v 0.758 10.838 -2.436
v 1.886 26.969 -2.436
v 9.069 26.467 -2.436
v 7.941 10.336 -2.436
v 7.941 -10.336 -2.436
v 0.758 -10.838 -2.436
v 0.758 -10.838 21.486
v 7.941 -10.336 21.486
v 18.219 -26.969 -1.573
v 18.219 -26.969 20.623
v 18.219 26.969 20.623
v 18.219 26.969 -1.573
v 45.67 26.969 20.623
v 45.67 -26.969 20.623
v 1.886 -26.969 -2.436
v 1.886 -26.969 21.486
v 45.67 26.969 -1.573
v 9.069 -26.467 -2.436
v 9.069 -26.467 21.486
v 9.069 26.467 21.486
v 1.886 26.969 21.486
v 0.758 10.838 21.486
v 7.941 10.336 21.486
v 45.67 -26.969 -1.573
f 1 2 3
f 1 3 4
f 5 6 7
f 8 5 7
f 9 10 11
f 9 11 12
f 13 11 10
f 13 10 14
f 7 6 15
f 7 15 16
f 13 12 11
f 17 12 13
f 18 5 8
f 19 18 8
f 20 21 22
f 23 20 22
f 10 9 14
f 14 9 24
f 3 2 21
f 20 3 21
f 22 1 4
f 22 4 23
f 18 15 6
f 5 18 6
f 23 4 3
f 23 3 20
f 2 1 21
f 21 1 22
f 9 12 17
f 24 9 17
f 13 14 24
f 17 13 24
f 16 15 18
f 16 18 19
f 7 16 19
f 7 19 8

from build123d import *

# Parameters (mm, degrees)
BODY_DEPTH                     = 19.05
SKETCH4_R                      = 5.9436
F_10_HEAD_CLEARANCE_DEPTH      = 48.971655672
F_10_NUT_CLEARANCE_DEPTH       = 46.868801757
F_10_NUT_CLEARANCE_DEPTH_BACK  = 4.7625
FILLET2_R                      = 8.89
F_10_CLEARANCE_HOLE1_D         = 5.1054
FILLET3_R                      = 5.08
FILLET4_R                      = 2.54
F_10_CLEARANCE_HOLE2_D         = 5.1054
SKETCH11_W                     = 23.92163958
SKETCH11_H                     = 16.170942948
INFILL_BOX_MOUNT_DEPTH         = 7.2008
INFILL_BOUNDING_BOX_DEPTH      = 26.969445
INFILL_BOUNDING_BOX_DEPTH_BACK = 26.969445
SKETCH9_W                      = 27.451683019
SKETCH9_H                      = 22.196172726


# Read off the part's stored shape, not the designer's step: Body
with BuildPart() as part:
    # Body outline → Body (new body)
    with BuildSketch(Plane.XY):
        with BuildLine():
            ThreePointArc((19.563256599, 8.1915), (16.002518677, 13.919090379), (10.823670896, 18.239238727))
            Line((10.823670896, 18.239238727), (11.330509573, 25.487369503))
            Line((11.330509573, 25.487369503), (1.828711995, 26.151799916))
            Line((1.828711995, 26.151799916), (0.815034639, 11.655538363))
            ThreePointArc((0.815034639, 11.655538363), (11.684, 0), (0.815034639, -11.655538363))
            Line((0.815034639, -11.655538363), (1.828711995, -26.151799916))
            Line((1.828711995, -26.151799916), (11.330509573, -25.487369503))
            Line((11.330509573, -25.487369503), (10.823670896, -18.239238727))
            ThreePointArc((10.823670896, -18.239238727), (16.002518677, -13.919090379), (19.563256599, -8.1915))
            Line((19.563256599, -8.1915), (41.469504125, -8.1915))
            Line((41.469504125, -8.1915), (41.469504125, -5.0165))
            Line((41.469504125, -5.0165), (20.607193131, -5.0165))
            ThreePointArc((20.607193131, -5.0165), (20.948626487, -3.313114744), (21.149504125, -1.5875))
            Line((21.149504125, -1.5875), (41.469504125, -1.5875))
            Line((41.469504125, -1.5875), (41.469504125, 1.5875))
            Line((41.469504125, 1.5875), (21.149504125, 1.5875))
            ThreePointArc((21.149504125, 1.5875), (20.948626487, 3.313114744), (20.607193131, 5.0165))
            Line((20.607193131, 5.0165), (41.469504125, 5.0165))
            Line((41.469504125, 5.0165), (41.469504125, 8.1915))
            Line((41.469504125, 8.1915), (19.563256599, 8.1915))
        make_face()
    extrude(amount=BODY_DEPTH)

    # Sketch3 → CBORE for #10 Binding Head Machine Screw1 (revolve, cut)
    with BuildSketch(Plane(origin=(10.823670896, -18.239238727, 9.525), x_dir=(-0.06975647374412856, 0.9975640502598241, 0), z_dir=(0, 0, 1))):
        Polygon((0, 0), (0, 10.536208088), (2.5527, 10.536208088), (2.5527, 3.1242), (5.9436, 3.1242), (5.9436, 0), align=None)
    revolve(axis=Axis((17.158202615, -17.796285119, 9.525), (-0.9975640502598241, -0.06975647374412855, 0)), mode=Mode.SUBTRACT)

    # Sketch4 → #10 Head clearance (cut, through all)
    with BuildSketch(Plane(origin=(6.385207973, 0.446497237, 0), x_dir=(-0.06975647374412856, 0.9975640502598241, 0), z_dir=(0.9975640502598241, 0.06975647374412856, 0))):
        with Locations((-18.949829973, 9.525)):
            Circle(SKETCH4_R)
    extrude(amount=F_10_HEAD_CLEARANCE_DEPTH, mode=Mode.SUBTRACT)

    # Sketch5 → #10 nut clearance (cut, two sides: drawn at the far end of the back side and taken through both)
    with BuildSketch(Plane(origin=(9.501797579, -0.664430412, 0), x_dir=(-0.06975647374412855, -0.9975640502598241, 0), z_dir=(0.9975640502598241, -0.06975647374412855, 0)).offset(-F_10_NUT_CLEARANCE_DEPTH_BACK)):
        Polygon((-23.902829973, -6.665384117), (-23.902829973, -12.384615883), (-18.949829973, -15.244231767), (-13.996829973, -12.384615883), (-13.996829973, -6.665384117), (-18.949829973, -3.805768233), align=None)
    extrude(amount=F_10_NUT_CLEARANCE_DEPTH + F_10_NUT_CLEARANCE_DEPTH_BACK, mode=Mode.SUBTRACT)

    # Fillet2
    fillet2_edges = [part.edges().sort_by_distance(p)[0] for p in [
        (41.469504125, 6.604, 0),
        (41.469504125, 0, 0),
        (41.469504125, -6.604, 0),
        (41.469504125, -6.604, 19.05),
        (41.469504125, 0, 19.05),
        (41.469504125, 6.604, 19.05),
    ]]
    fillet(fillet2_edges, radius=FILLET2_R)

    # #10 Clearance Hole1 (through all)
    with Locations(Plane(origin=(0, -8.1915, 0), x_dir=(-1, 0, 0), z_dir=(0, -1, 0))):
        with Locations((-31.944504125, -9.525)):
            Hole(F_10_CLEARANCE_HOLE1_D / 2)

    # Fillet3
    fillet3_edges = [part.edges().sort_by_distance(p)[0] for p in [
        (19.563256599, 8.1915, 9.525),
        (19.563256599, -8.1915, 9.525),
    ]]
    fillet(fillet3_edges, radius=FILLET3_R)

    # Fillet4
    # the kernel refuses this fillet: 2.54 mm, written as the material it adds along each edge
    with BuildSketch(Plane(origin=(10.823670896, 18.239238727, 0), x_dir=(0.06975647364615441, 0.997564050266675, 0), z_dir=(0, 0, 1))) as fillet4_piece_1_section:
        with BuildLine():
            CenterArc((1.506239444, -2.54), FILLET4_R, 90, 59.467874794)
            ThreePointArc((-0.681575467, -1.249625668), (-0.330301403, -0.630532327), (0, 0))
            Line((0, 0), (1.506239444, 0))
        make_face()
    fillet4_piece_1 = extrude(amount=7.571366843, mode=Mode.PRIVATE)
    fillet4_piece_1 = split(fillet4_piece_1, bisect_by=Plane(origin=(11.045496334, 17.483235197, 3.379286412), z_dir=(0.034878236872064254, 0.49878202512991177, -0.8660254037844389)), keep=Keep.TOP, mode=Mode.PRIVATE)
    fillet4_piece_1 = split(fillet4_piece_1, bisect_by=Plane(origin=(11.16675059, 19.217251842, 3.228670408), z_dir=(-0.0348782368720643, -0.49878202512991243, -0.8660254037844384)), keep=Keep.TOP, mode=Mode.PRIVATE)
    add(fillet4_piece_1)
    with BuildSketch(Plane(origin=(10.823670896, 18.239238727, 0), x_dir=(0.06975647364615441, 0.997564050266675, 0), z_dir=(0, 0, 1))) as fillet4_piece_2_section:
        with BuildLine():
            CenterArc((1.506239444, -2.54), FILLET4_R, 90, 59.467874794)
            ThreePointArc((-0.681575467, -1.249625668), (-0.330301403, -0.630532327), (0, 0))
            Line((0, 0), (1.506239444, 0))
        make_face()
    fillet4_piece_2 = extrude(amount=7.571366843, mode=Mode.PRIVATE)
    fillet4_piece_2 = split(fillet4_piece_2, bisect_by=Plane(origin=(11.538192523, 17.902598899, 3.640659173), z_dir=(-0.034878236872064254, -0.49878202512991177, 0.8660254037844389)), keep=Keep.TOP, mode=Mode.PRIVATE)
    fillet4_piece_2 = split(fillet4_piece_2, bisect_by=Plane(origin=(11.538192523, 17.902598899, 3.970877294), z_dir=(-0.0348782368720643, -0.49878202512991243, -0.8660254037844384)), keep=Keep.TOP, mode=Mode.PRIVATE)
    add(fillet4_piece_2)
    with BuildSketch(Plane(origin=(10.823670896, 18.239238727, 0), x_dir=(0.06975647364615441, 0.997564050266675, 0), z_dir=(0, 0, 1))) as fillet4_piece_3_section:
        with BuildLine():
            CenterArc((1.506239444, -2.54), FILLET4_R, 90, 59.467874794)
            ThreePointArc((-0.681575467, -1.249625668), (-0.330301403, -0.630532327), (0, 0))
            Line((0, 0), (1.506239444, 0))
        make_face()
    fillet4_piece_3 = extrude(amount=7.571366843, mode=Mode.PRIVATE)
    fillet4_piece_3 = split(fillet4_piece_3, bisect_by=Plane(origin=(10.910701379, 18.802736053, 4.133816124), z_dir=(0.034878236872064254, 0.49878202512991177, -0.8660254037844389)), keep=Keep.TOP, mode=Mode.PRIVATE)
    fillet4_piece_3 = split(fillet4_piece_3, bisect_by=Plane(origin=(10.910701379, 18.802736053, 3.477720343), z_dir=(0.0348782368720643, 0.49878202512991243, 0.8660254037844384)), keep=Keep.TOP, mode=Mode.PRIVATE)
    add(fillet4_piece_3)
    with BuildSketch(Plane(origin=(10.823670896, 18.239238727, 11.478633157), x_dir=(0.06975647364615441, 0.997564050266675, 0), z_dir=(0, 0, 1))) as fillet4_piece_4_section:
        with BuildLine():
            CenterArc((1.506239444, -2.54), FILLET4_R, 90, 59.467874794)
            ThreePointArc((-0.681575467, -1.249625668), (-0.330301403, -0.630532327), (0, 0))
            Line((0, 0), (1.506239444, 0))
        make_face()
    fillet4_piece_4 = extrude(amount=7.571366843, mode=Mode.PRIVATE)
    fillet4_piece_4 = split(fillet4_piece_4, bisect_by=Plane(origin=(11.538192523, 17.902598899, 15.409340827), z_dir=(-0.03487823687206431, -0.4987820251299125, -0.8660254037844386)), keep=Keep.TOP, mode=Mode.PRIVATE)
    fillet4_piece_4 = split(fillet4_piece_4, bisect_by=Plane(origin=(11.538192523, 17.902598899, 15.079122706), z_dir=(-0.034878236872064254, -0.49878202512991177, 0.8660254037844388)), keep=Keep.TOP, mode=Mode.PRIVATE)
    add(fillet4_piece_4)
    with BuildSketch(Plane(origin=(10.823670896, 18.239238727, 11.478633157), x_dir=(0.06975647364615441, 0.997564050266675, 0), z_dir=(0, 0, 1))) as fillet4_piece_5_section:
        with BuildLine():
            CenterArc((1.506239444, -2.54), FILLET4_R, 90, 59.467874794)
            ThreePointArc((-0.681575467, -1.249625668), (-0.330301403, -0.630532327), (0, 0))
            Line((0, 0), (1.506239444, 0))
        make_face()
    fillet4_piece_5 = extrude(amount=7.571366843, mode=Mode.PRIVATE)
    fillet4_piece_5 = split(fillet4_piece_5, bisect_by=Plane(origin=(10.910701379, 18.802736053, 14.916183876), z_dir=(0.03487823687206431, 0.4987820251299125, 0.8660254037844386)), keep=Keep.TOP, mode=Mode.PRIVATE)
    fillet4_piece_5 = split(fillet4_piece_5, bisect_by=Plane(origin=(10.910701379, 18.802736053, 15.572279657), z_dir=(0.034878236872064254, 0.49878202512991177, -0.8660254037844388)), keep=Keep.TOP, mode=Mode.PRIVATE)
    add(fillet4_piece_5)
    with BuildSketch(Plane(origin=(10.823670896, 18.239238727, 11.478633157), x_dir=(0.06975647364615441, 0.997564050266675, 0), z_dir=(0, 0, 1))) as fillet4_piece_6_section:
        with BuildLine():
            CenterArc((1.506239444, -2.54), FILLET4_R, 90, 59.467874794)
            ThreePointArc((-0.681575467, -1.249625668), (-0.330301403, -0.630532327), (0, 0))
            Line((0, 0), (1.506239444, 0))
        make_face()
    fillet4_piece_6 = extrude(amount=7.571366843, mode=Mode.PRIVATE)
    fillet4_piece_6 = split(fillet4_piece_6, bisect_by=Plane(origin=(11.045496334, 17.483235197, 15.670713588), z_dir=(0.03487823687206431, 0.4987820251299125, 0.8660254037844386)), keep=Keep.TOP, mode=Mode.PRIVATE)
    fillet4_piece_6 = split(fillet4_piece_6, bisect_by=Plane(origin=(11.16675059, 19.217251842, 15.821329592), z_dir=(-0.034878236872064254, -0.49878202512991177, 0.8660254037844388)), keep=Keep.TOP, mode=Mode.PRIVATE)
    add(fillet4_piece_6)
    with BuildSketch(Plane(origin=(10.823670896, -18.239238727, 0), x_dir=(0.8423668352181145, 0.5389045508479382, 0), z_dir=(0, 0, 1))) as fillet4_piece_7_section:
        with BuildLine():
            CenterArc((1.50864912, -2.538569498), FILLET4_R, 91.92302723, 59.467874794)
            Line((-0.721234541, -1.322338081), (0, 0))
            ThreePointArc((0, 0), (0.711707353, -0.011944694), (1.423414707, 0))
        make_face()
    fillet4_piece_7 = extrude(amount=7.34699861, mode=Mode.PRIVATE)
    fillet4_piece_7 = fillet4_piece_7 - Plane(origin=(11.093024208, -18.220403709, 9.525), x_dir=(-0.06975647374412856, 0.9975640502598241, 0), z_dir=(-0.9975640502598241, -0.06975647374412856, 0)) * Cylinder(5.9436, 21, mode=Mode.PRIVATE)
    add(fillet4_piece_7)
    with BuildSketch(Plane(origin=(10.823670896, -18.239238727, 11.70300139), x_dir=(0.8423668352181142, 0.5389045508479389, 0), z_dir=(0, 0, 1))) as fillet4_piece_8_section:
        with BuildLine():
            CenterArc((1.50864912, -2.538569498), FILLET4_R, 91.92302723, 59.467874794)
            Line((-0.721234541, -1.322338081), (0, 0))
            ThreePointArc((0, 0), (0.711707353, -0.011944694), (1.423414707, 0))
        make_face()
    fillet4_piece_8 = extrude(amount=7.34699861, mode=Mode.PRIVATE)
    fillet4_piece_8 = fillet4_piece_8 - Plane(origin=(11.09302416, -18.220403712, 9.525), x_dir=(-0.06975647374412856, 0.9975640502598241, 0), z_dir=(-0.9975640502598241, -0.06975647374412856, 0)) * Cylinder(5.9436, 21, mode=Mode.PRIVATE)
    add(fillet4_piece_8)
    # the kernel refuses this fillet: 2.54 mm, written as the material it takes off along each edge
    with BuildSketch(Plane(origin=(11.330509573, -25.487369503, -6.349999999), x_dir=(-0.06975647364615452, 0.997564050266675, 0), z_dir=(0, 0, 1)), Plane(origin=(11.330509573, 25.487369503, -6.349999999), x_dir=(-0.997564050255164, 0.06975647381076958, 0), z_dir=(0, 0, 1))) as fillet4_2_piece_1:
        with BuildLine():
            CenterArc((FILLET4_R, FILLET4_R), FILLET4_R, 180.000000009, 89.999999991)
            Line((-FILLET4_R * 1.65018418464e-10, FILLET4_R), (0, 0))
            Line((0, 0), (FILLET4_R, 0))
        make_face()
    extrude(amount=31.749999998, mode=Mode.SUBTRACT)
    with BuildSketch(Plane(origin=(1.828711995, -26.151799916, -6.35), x_dir=(0.9975640502551639, 0.0697564738107699, 0), z_dir=(0, 0, 1)), Plane(origin=(1.828711995, 26.151799916, -6.35), x_dir=(-0.06975647377832653, -0.9975640502574327, 0), z_dir=(0, 0, 1))) as fillet4_2_piece_2:
        with BuildLine():
            CenterArc((FILLET4_R, FILLET4_R), FILLET4_R, 179.999999998, 90.000000002)
            Line((0, FILLET4_R), (0, 0))
            Line((0, 0), (FILLET4_R, 0))
        make_face()
    extrude(amount=31.75, mode=Mode.SUBTRACT)
    with BuildSketch(Plane(origin=(0.815034639, -11.655538363, -5.778442378), x_dir=(0.06975647377832637, -0.9975640502574326, 0), z_dir=(0, 0, 1))) as fillet4_2_piece_3:
        with BuildLine():
            CenterArc((2.311376951, 2.54), FILLET4_R, 190.286560608, 79.713439392)
            ThreePointArc((-0.187797504, 2.086428572), (-0.047044084, 1.047431631), (0, 0))
            Line((0, 0), (2.311376951, 0))
        make_face()
    extrude(amount=30.606884756, mode=Mode.SUBTRACT)
    with BuildSketch(Plane(origin=(0.815034639, 11.655538363, -5.778442378), x_dir=(0.9872940550084358, -0.1589038984575255, 0), z_dir=(0, 0, 1))) as fillet4_2_piece_4:
        with BuildLine():
            CenterArc((2.322565791, 2.529773025), FILLET4_R, 185.143280302, 79.713439392)
            Line((-0.207207235, 2.302070497), (0, 0))
            ThreePointArc((0, 0), (1.047431631, 0.047044085), (2.094863262, 0))
        make_face()
    extrude(amount=30.606884756, mode=Mode.SUBTRACT)

    # #10 Clearance Hole2 (through all)
    with Locations(Plane(origin=(4.750898789, -0.332215206, 0), x_dir=(0, 0, -1), z_dir=(0.9975640502598241, -0.06975647374412854, 0))):
        with Locations((-9.525, 18.949829973)):
            Hole(F_10_CLEARANCE_HOLE2_D / 2)


with BuildPart() as body_2:
    # Sketch11 → Infill box -mount (new body)
    with BuildSketch(Plane(origin=(0, 0, 0), x_dir=(0, 0, 1), z_dir=(-0.9975640502598241, -0.06975647374412852, 0))):
        with Locations((9.525, -18.949829973)):
            Rectangle(SKETCH11_W, SKETCH11_H)
    extrude(amount=-INFILL_BOX_MOUNT_DEPTH)


with BuildPart() as body_3:
    # Mirror3: mirrored copy
    add(body_2.part.mirror(Plane.ZX))


with BuildPart() as body_4:
    # Sketch9 → Infill bounding box (new, two sides: drawn at the far end of the back side and taken through both)
    with BuildSketch(Plane(origin=(0, 0, 0), x_dir=(1, 0, 0), z_dir=(0, 1, 0)).offset(-INFILL_BOUNDING_BOX_DEPTH_BACK)):
        with Locations((31.944504126, -9.525)):
            Rectangle(SKETCH9_W, SKETCH9_H)
    extrude(amount=INFILL_BOUNDING_BOX_DEPTH + INFILL_BOUNDING_BOX_DEPTH_BACK)


solid = Compound([body_2.part, body_3.part, body_4.part])
